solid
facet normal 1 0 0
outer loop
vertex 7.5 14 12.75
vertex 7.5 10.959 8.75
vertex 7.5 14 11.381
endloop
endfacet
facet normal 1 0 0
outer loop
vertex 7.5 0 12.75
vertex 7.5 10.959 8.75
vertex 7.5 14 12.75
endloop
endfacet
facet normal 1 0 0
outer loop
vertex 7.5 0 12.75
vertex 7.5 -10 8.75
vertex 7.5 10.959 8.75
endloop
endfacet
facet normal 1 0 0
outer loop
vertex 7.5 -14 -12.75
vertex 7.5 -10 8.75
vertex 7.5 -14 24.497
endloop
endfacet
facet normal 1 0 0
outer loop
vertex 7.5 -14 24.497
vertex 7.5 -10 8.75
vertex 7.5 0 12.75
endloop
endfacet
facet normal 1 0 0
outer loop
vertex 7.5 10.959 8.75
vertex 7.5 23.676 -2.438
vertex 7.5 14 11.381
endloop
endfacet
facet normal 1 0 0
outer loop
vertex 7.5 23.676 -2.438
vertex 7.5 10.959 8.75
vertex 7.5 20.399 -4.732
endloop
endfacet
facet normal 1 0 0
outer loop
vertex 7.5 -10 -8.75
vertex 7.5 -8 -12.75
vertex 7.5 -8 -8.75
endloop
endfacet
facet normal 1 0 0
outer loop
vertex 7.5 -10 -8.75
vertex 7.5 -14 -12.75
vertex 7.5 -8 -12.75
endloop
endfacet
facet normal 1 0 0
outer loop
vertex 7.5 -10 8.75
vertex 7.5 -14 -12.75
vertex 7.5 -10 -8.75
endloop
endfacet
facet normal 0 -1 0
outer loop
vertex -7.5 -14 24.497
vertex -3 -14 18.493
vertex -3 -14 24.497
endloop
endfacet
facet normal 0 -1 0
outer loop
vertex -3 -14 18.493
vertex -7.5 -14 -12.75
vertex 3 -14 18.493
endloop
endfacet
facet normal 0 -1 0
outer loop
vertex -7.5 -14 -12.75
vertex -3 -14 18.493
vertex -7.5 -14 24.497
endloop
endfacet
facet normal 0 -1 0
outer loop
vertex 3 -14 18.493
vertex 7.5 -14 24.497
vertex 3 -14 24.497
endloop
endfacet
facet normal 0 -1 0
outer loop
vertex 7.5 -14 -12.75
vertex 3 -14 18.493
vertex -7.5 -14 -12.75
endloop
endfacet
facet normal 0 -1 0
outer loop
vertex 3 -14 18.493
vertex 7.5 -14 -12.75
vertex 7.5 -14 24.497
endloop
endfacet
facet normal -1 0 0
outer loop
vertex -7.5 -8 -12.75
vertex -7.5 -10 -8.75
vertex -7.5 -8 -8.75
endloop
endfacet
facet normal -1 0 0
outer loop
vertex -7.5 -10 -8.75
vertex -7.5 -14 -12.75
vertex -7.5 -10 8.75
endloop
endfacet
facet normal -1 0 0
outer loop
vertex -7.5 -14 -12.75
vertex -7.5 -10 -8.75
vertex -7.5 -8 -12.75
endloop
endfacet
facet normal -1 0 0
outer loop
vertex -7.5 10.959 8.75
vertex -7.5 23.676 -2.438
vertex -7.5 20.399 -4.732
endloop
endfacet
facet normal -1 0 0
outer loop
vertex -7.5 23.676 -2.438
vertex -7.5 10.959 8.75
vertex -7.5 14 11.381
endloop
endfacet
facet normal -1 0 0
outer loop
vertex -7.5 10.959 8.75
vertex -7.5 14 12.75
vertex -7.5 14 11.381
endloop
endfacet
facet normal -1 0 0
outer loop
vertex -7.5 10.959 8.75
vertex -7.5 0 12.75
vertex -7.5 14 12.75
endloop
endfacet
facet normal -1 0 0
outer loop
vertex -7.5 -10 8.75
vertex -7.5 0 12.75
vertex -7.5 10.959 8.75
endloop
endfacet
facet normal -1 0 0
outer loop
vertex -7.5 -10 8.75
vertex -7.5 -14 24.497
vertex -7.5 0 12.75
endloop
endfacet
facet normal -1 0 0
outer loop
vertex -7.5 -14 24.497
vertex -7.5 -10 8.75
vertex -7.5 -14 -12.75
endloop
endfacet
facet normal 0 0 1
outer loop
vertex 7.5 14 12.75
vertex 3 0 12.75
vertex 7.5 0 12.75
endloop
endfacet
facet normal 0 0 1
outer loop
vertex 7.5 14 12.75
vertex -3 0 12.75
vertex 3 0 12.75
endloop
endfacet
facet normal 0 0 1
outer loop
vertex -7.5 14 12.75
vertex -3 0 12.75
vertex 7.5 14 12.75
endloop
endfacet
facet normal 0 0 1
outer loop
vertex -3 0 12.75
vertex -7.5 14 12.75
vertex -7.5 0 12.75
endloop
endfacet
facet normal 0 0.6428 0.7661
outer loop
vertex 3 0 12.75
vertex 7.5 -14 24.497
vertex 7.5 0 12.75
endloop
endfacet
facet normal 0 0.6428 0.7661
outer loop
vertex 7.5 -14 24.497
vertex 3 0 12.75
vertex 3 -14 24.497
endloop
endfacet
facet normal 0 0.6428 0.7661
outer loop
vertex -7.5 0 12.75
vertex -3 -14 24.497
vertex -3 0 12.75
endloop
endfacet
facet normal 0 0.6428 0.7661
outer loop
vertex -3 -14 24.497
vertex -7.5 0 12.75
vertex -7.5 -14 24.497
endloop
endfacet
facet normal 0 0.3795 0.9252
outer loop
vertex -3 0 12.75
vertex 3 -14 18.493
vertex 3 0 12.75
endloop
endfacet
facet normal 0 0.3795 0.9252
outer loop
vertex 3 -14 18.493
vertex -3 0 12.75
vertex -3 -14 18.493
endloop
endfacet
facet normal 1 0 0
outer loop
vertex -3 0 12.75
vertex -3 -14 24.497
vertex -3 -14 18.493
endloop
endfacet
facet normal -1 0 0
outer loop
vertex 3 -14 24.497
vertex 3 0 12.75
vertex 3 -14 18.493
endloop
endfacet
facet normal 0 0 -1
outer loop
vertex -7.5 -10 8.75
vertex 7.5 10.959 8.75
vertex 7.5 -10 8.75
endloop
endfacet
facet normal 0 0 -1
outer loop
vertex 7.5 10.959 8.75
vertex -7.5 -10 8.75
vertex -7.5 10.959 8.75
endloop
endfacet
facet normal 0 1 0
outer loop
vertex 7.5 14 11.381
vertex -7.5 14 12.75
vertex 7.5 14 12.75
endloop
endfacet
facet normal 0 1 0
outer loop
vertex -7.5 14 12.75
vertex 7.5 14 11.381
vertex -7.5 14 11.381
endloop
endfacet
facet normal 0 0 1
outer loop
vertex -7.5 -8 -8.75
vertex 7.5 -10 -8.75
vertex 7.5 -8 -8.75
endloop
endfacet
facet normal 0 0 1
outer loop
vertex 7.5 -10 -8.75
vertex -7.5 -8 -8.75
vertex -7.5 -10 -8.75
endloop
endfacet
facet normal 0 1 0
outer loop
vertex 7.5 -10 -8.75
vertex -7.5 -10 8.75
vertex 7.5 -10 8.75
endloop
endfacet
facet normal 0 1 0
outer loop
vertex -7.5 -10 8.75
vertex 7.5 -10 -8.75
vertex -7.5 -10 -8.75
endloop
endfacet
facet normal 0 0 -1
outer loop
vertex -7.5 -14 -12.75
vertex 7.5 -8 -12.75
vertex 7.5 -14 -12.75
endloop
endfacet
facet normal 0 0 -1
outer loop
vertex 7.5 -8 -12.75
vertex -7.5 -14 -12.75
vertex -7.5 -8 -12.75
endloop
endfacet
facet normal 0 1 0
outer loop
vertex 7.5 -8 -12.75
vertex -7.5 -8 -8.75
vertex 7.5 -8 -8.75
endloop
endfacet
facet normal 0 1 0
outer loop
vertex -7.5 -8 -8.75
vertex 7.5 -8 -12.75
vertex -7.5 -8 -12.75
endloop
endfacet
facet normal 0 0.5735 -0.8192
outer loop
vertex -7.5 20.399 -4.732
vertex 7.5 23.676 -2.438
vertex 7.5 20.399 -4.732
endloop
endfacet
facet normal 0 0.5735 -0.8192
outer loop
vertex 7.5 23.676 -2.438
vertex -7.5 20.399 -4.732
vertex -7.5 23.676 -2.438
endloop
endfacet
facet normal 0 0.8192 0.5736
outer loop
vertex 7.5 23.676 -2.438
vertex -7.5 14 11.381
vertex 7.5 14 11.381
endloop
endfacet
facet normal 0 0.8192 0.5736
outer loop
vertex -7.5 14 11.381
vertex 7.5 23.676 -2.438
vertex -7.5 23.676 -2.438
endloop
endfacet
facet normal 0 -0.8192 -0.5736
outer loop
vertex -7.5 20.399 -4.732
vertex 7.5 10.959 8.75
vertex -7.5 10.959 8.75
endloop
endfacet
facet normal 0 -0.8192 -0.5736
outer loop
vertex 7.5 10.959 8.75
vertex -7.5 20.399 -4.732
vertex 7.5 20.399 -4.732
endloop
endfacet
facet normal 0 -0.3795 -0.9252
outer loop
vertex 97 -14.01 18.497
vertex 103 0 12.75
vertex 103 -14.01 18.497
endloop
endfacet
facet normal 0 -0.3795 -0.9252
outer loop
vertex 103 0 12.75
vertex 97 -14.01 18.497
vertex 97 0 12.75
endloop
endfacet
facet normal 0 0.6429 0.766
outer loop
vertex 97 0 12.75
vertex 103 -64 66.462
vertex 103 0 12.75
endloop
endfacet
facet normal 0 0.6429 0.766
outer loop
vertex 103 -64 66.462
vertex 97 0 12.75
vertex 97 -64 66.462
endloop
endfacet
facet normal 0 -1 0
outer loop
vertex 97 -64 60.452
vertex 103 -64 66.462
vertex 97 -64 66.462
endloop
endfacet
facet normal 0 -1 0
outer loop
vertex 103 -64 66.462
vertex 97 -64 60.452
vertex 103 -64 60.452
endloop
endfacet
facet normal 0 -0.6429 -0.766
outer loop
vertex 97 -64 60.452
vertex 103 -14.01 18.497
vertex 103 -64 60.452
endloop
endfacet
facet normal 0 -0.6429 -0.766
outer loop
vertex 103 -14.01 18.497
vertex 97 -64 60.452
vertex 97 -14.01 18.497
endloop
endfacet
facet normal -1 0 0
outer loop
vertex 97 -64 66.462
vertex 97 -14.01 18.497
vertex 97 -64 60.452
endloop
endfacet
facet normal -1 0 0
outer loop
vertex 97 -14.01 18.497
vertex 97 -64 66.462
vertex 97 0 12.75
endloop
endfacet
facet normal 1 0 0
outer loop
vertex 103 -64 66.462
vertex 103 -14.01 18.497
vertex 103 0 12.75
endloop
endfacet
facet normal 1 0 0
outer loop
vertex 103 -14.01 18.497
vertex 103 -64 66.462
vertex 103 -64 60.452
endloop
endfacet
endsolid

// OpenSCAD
thickness = 4;
monitor_thickness = 20;
ext_thickness = monitor_thickness+thickness*2;
bezel_height = 17.5;
width = 15;
arm_length = 50;
arm_width = 6;
tri_thickness = arm_width;
angle = 40;
back_angle = 35;
gripper_thickness = 2;

//section of monitor bezel
% cube([width+20, monitor_thickness, bezel_height], center=true);

translate([0, 0, bezel_height/2+thickness/2])
cube([width, ext_thickness, thickness], center=true);

translate([0, -(monitor_thickness+thickness)/2, 0])
cube([width, thickness, bezel_height], center=true);

translate([0, -(monitor_thickness+thickness-gripper_thickness)/2, -(bezel_height+thickness)/2])
cube([width, thickness+gripper_thickness, thickness], center=true);


translate([0, (monitor_thickness+thickness)/2, bezel_height/2+thickness/2])
rotate([back_angle, 0, 0])
translate([0, 0, -bezel_height/2])
cube([width, thickness, bezel_height], center=true);


a = ext_thickness/2;
module tri_arm() {
translate([0, 0, bezel_height/2+thickness]) rotate([90, 0, 270]) {

    linear_extrude(arm_width, center=true) translate([ext_thickness/2-a, 0, 0])
    polygon([
    //[a, 0],
    [a+0.01, (tan(angle)*a)-tri_thickness],
    [a+arm_length, (tan(angle)*(a+arm_length))-tri_thickness],
    [a+arm_length, (tan(angle)*(a+arm_length))+0.01],
    [0, 0]
    ]);
}
}

module tri() {
translate([0, 0, bezel_height/2+thickness]) rotate([90, 0, 270]) {
    linear_extrude(width, center=true) translate([ext_thickness/2-a, 0, 0])
    polygon([
    [a, 0],
    [a, (tan(angle)*a)],
    [0, 0]
    ]);
}
}

difference() {
    tri();
    tri_arm();
}
translate([100, 0, 0]) tri_arm();

//translate([width/2, -monitor_thickness/2-thickness/sin(angle), bezel_height/2+thickness]) rotate([angle, 0, 180]) cube([width, arm_length, tri_thickness]);
